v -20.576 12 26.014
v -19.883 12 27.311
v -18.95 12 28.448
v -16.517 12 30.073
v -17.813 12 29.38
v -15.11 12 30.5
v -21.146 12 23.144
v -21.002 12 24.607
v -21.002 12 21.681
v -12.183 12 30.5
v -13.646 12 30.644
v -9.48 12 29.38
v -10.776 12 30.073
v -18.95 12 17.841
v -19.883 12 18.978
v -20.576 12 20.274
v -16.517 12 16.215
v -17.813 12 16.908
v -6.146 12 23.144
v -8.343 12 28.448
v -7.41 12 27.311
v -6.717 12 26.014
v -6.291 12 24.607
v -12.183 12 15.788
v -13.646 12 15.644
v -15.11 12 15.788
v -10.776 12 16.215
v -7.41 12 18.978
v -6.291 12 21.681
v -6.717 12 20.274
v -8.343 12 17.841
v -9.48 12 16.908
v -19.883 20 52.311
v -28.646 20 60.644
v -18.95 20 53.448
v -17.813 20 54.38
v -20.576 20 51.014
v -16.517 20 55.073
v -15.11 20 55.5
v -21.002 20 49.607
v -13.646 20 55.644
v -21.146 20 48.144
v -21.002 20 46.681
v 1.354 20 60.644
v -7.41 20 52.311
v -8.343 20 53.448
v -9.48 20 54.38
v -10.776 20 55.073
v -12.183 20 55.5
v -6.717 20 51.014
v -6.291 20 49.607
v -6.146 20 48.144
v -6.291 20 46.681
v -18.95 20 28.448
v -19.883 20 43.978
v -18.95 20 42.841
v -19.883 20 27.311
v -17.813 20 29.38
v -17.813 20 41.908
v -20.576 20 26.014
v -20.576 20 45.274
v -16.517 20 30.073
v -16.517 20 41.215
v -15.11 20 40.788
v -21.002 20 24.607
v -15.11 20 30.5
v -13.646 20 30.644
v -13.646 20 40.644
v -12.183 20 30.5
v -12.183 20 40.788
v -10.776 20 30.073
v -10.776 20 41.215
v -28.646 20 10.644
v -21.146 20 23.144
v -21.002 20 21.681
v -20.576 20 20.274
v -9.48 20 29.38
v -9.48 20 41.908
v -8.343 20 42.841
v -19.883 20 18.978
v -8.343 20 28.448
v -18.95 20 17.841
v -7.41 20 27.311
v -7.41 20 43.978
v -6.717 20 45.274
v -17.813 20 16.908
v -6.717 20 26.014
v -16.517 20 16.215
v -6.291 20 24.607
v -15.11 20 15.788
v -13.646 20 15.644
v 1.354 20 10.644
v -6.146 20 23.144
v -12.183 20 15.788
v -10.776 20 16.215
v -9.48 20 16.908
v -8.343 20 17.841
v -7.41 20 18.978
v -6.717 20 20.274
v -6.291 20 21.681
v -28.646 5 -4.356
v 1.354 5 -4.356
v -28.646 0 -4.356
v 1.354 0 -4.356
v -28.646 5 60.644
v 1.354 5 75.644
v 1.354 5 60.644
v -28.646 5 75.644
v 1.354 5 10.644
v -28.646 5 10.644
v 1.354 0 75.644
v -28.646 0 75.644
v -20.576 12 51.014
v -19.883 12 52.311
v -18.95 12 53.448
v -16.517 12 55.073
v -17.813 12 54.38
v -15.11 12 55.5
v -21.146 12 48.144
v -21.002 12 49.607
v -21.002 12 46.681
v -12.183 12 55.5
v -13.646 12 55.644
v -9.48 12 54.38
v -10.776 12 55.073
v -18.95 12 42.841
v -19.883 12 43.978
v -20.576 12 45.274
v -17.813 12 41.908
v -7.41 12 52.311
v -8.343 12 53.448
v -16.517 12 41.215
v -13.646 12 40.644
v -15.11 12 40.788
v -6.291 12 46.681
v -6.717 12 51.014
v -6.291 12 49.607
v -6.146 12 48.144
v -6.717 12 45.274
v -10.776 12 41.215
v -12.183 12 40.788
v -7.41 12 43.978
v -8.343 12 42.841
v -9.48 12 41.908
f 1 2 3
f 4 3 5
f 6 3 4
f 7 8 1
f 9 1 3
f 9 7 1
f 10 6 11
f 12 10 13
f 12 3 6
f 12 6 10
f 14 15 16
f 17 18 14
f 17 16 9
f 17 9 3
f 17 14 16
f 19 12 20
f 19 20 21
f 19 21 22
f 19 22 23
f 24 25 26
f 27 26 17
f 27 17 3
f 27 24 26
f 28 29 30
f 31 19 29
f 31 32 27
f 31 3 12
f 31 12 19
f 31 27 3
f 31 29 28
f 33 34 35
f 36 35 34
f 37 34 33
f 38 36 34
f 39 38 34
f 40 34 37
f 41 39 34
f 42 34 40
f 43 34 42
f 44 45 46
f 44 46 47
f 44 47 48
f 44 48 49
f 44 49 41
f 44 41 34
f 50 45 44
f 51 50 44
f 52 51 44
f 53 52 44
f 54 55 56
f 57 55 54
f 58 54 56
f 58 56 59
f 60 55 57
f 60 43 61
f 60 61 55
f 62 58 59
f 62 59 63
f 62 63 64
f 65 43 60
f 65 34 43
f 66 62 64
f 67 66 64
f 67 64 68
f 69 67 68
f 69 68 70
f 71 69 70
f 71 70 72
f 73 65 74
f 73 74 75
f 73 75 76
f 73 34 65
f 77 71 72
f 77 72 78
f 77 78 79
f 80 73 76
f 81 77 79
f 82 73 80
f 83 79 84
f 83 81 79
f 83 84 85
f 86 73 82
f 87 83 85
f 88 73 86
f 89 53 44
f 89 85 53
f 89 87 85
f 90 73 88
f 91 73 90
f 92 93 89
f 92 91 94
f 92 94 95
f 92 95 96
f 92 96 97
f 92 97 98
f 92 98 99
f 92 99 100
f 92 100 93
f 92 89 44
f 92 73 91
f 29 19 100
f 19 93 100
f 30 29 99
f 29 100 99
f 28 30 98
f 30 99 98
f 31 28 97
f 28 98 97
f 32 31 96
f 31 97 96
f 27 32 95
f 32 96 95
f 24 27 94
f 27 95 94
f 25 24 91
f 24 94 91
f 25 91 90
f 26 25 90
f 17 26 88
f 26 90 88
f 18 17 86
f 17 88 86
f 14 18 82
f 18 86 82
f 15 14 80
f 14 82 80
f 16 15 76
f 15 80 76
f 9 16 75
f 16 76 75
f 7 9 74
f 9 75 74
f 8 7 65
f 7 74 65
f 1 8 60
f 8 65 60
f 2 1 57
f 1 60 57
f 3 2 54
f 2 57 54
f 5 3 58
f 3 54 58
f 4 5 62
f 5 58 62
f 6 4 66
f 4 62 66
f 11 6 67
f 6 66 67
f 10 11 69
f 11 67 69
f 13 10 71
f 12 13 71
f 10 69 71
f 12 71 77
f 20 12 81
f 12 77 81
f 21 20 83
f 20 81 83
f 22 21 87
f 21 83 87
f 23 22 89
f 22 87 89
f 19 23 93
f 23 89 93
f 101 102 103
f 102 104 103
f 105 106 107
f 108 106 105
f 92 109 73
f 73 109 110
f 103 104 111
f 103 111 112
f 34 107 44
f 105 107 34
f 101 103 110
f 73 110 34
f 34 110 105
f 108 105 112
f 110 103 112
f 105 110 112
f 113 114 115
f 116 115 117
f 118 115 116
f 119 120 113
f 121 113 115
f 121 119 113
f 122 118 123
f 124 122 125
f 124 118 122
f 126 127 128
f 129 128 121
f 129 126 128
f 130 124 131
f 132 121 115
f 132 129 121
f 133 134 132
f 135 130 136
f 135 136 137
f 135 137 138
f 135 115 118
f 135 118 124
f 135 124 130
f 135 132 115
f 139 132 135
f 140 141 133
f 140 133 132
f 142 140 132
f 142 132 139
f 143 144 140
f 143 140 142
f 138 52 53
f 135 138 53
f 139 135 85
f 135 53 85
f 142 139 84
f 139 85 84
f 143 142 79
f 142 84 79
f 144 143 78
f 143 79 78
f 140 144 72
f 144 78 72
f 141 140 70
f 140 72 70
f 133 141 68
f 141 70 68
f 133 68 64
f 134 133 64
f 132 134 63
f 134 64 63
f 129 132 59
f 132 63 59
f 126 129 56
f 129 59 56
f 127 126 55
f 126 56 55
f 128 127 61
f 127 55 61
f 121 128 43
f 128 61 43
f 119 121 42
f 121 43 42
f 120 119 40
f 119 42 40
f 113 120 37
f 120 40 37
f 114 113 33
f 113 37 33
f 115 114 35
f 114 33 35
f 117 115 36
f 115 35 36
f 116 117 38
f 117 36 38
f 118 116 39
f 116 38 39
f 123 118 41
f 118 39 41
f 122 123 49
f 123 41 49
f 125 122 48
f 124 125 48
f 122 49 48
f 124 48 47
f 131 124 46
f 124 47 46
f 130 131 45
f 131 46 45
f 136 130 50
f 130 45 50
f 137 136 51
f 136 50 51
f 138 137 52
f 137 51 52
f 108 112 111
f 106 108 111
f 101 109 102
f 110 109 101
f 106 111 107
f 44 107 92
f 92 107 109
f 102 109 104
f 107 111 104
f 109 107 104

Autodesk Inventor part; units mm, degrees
ref_plane "YZ Plane" through (0, 0, 0) normal (1, 0, 0) x (0, 1, 0)
ref_plane "XZ Plane" through (0, 0, 0) normal (0, 1, 0) x (-1, 0, 0)
ref_plane "XY Plane" through (0, 0, 0) normal (0, 0, 1) x (1, 0, 0)
sketch "Sketch1" plane through (0, 0, 0) normal (0, 1, 0) x (-1, 0, 0)
  line L0 (28.6465, 75.6443) -> (-1.3535, 75.6443)
  line L1 (-1.3535, 75.6443) -> (-1.3535, -4.3557)
  line L2 (-1.3535, -4.3557) -> (28.6465, -4.3557)
  line L3 (28.6465, -4.3557) -> (28.6465, 75.6443)
  point P0 (0, 0)
  dimension "d0" = 30
  dimension "d1" = 80
extrude "Extrusion1" add sketch "Sketch1" along normal blind 5
sketch "Sketch2" plane through (0, 5, 0) normal (0, 1, 0) x (1, 0, 0)
  line L0 (1.3535, -75.6443) -> (1.3535, 4.3557) projected
  line L1 (-28.6465, -75.6443) -> (1.3535, -75.6443)
  line L2 (1.3535, -75.6443) -> (1.3535, -60.6443)
  line L3 (1.3535, -60.6443) -> (-28.6465, -60.6443)
  line L4 (-28.6465, -60.6443) -> (-28.6465, -75.6443)
  line L5 (-28.6465, 4.3557) -> (1.3535, 4.3557)
  line L6 (1.3535, 4.3557) -> (1.3535, -10.6443)
  line L7 (1.3535, -10.6443) -> (-28.6465, -10.6443)
  line L8 (-28.6465, -10.6443) -> (-28.6465, 4.3557)
  line L9 (-28.6465, -60.6443) -> (1.3535, -60.6443)
  line L10 (1.3535, -60.6443) -> (1.3535, -10.6443)
  line L11 (1.3535, -10.6443) -> (-28.6465, -10.6443)
  line L12 (-28.6465, -10.6443) -> (-28.6465, -60.6443)
  point P0 (0, 0)
  dimension "d4" = 15
  dimension "d5" = 15
extrude "Extrusion2" add sketch "Sketch2" along normal blind 15 contours L3 L12 L7 L0
sketch "Sketch3" plane through (0, 20, 0) normal (0, 1, 0) x (1, 0, 0)
  line L0 (1.3535, -60.6443) -> (-28.6465, -60.6443) projected
  line L1 (-13.6465, -60.6443) -> (-13.6465, -10.6443)
  line L2 (1.3535, -10.6443) -> (-28.6465, -10.6443) projected
  line L3 (-28.6465, 4.3557) -> (-28.6465, -75.6443) projected
  line L4 (-28.6465, -35.6443) -> (1.3535, -35.6443)
  line L5 (1.3535, -75.6443) -> (1.3535, 4.3557) projected
  line L6 (-13.6465, -60.6443) -> (-13.6465, -36.1443)
  line L7 (-13.6465, -60.6443) -> (-13.6465, -48.1443)
  circle A0 centre (-13.6465, -48.1443) radius 7.5
  circle A1 centre (-13.6465, -23.1443) radius 7.5
  point P0 (0, 0)
  dimension "d8" = 50
  dimension "d9" = 24.5
  dimension "d10" = 12.5
  dimension "d11" = 15
extrude "Extrusion4" cut sketch "Sketch3" against normal blind 8 contours A0 L1 | L1 A0 | A1 L1 | L1 A1
properties part number "sonar"
